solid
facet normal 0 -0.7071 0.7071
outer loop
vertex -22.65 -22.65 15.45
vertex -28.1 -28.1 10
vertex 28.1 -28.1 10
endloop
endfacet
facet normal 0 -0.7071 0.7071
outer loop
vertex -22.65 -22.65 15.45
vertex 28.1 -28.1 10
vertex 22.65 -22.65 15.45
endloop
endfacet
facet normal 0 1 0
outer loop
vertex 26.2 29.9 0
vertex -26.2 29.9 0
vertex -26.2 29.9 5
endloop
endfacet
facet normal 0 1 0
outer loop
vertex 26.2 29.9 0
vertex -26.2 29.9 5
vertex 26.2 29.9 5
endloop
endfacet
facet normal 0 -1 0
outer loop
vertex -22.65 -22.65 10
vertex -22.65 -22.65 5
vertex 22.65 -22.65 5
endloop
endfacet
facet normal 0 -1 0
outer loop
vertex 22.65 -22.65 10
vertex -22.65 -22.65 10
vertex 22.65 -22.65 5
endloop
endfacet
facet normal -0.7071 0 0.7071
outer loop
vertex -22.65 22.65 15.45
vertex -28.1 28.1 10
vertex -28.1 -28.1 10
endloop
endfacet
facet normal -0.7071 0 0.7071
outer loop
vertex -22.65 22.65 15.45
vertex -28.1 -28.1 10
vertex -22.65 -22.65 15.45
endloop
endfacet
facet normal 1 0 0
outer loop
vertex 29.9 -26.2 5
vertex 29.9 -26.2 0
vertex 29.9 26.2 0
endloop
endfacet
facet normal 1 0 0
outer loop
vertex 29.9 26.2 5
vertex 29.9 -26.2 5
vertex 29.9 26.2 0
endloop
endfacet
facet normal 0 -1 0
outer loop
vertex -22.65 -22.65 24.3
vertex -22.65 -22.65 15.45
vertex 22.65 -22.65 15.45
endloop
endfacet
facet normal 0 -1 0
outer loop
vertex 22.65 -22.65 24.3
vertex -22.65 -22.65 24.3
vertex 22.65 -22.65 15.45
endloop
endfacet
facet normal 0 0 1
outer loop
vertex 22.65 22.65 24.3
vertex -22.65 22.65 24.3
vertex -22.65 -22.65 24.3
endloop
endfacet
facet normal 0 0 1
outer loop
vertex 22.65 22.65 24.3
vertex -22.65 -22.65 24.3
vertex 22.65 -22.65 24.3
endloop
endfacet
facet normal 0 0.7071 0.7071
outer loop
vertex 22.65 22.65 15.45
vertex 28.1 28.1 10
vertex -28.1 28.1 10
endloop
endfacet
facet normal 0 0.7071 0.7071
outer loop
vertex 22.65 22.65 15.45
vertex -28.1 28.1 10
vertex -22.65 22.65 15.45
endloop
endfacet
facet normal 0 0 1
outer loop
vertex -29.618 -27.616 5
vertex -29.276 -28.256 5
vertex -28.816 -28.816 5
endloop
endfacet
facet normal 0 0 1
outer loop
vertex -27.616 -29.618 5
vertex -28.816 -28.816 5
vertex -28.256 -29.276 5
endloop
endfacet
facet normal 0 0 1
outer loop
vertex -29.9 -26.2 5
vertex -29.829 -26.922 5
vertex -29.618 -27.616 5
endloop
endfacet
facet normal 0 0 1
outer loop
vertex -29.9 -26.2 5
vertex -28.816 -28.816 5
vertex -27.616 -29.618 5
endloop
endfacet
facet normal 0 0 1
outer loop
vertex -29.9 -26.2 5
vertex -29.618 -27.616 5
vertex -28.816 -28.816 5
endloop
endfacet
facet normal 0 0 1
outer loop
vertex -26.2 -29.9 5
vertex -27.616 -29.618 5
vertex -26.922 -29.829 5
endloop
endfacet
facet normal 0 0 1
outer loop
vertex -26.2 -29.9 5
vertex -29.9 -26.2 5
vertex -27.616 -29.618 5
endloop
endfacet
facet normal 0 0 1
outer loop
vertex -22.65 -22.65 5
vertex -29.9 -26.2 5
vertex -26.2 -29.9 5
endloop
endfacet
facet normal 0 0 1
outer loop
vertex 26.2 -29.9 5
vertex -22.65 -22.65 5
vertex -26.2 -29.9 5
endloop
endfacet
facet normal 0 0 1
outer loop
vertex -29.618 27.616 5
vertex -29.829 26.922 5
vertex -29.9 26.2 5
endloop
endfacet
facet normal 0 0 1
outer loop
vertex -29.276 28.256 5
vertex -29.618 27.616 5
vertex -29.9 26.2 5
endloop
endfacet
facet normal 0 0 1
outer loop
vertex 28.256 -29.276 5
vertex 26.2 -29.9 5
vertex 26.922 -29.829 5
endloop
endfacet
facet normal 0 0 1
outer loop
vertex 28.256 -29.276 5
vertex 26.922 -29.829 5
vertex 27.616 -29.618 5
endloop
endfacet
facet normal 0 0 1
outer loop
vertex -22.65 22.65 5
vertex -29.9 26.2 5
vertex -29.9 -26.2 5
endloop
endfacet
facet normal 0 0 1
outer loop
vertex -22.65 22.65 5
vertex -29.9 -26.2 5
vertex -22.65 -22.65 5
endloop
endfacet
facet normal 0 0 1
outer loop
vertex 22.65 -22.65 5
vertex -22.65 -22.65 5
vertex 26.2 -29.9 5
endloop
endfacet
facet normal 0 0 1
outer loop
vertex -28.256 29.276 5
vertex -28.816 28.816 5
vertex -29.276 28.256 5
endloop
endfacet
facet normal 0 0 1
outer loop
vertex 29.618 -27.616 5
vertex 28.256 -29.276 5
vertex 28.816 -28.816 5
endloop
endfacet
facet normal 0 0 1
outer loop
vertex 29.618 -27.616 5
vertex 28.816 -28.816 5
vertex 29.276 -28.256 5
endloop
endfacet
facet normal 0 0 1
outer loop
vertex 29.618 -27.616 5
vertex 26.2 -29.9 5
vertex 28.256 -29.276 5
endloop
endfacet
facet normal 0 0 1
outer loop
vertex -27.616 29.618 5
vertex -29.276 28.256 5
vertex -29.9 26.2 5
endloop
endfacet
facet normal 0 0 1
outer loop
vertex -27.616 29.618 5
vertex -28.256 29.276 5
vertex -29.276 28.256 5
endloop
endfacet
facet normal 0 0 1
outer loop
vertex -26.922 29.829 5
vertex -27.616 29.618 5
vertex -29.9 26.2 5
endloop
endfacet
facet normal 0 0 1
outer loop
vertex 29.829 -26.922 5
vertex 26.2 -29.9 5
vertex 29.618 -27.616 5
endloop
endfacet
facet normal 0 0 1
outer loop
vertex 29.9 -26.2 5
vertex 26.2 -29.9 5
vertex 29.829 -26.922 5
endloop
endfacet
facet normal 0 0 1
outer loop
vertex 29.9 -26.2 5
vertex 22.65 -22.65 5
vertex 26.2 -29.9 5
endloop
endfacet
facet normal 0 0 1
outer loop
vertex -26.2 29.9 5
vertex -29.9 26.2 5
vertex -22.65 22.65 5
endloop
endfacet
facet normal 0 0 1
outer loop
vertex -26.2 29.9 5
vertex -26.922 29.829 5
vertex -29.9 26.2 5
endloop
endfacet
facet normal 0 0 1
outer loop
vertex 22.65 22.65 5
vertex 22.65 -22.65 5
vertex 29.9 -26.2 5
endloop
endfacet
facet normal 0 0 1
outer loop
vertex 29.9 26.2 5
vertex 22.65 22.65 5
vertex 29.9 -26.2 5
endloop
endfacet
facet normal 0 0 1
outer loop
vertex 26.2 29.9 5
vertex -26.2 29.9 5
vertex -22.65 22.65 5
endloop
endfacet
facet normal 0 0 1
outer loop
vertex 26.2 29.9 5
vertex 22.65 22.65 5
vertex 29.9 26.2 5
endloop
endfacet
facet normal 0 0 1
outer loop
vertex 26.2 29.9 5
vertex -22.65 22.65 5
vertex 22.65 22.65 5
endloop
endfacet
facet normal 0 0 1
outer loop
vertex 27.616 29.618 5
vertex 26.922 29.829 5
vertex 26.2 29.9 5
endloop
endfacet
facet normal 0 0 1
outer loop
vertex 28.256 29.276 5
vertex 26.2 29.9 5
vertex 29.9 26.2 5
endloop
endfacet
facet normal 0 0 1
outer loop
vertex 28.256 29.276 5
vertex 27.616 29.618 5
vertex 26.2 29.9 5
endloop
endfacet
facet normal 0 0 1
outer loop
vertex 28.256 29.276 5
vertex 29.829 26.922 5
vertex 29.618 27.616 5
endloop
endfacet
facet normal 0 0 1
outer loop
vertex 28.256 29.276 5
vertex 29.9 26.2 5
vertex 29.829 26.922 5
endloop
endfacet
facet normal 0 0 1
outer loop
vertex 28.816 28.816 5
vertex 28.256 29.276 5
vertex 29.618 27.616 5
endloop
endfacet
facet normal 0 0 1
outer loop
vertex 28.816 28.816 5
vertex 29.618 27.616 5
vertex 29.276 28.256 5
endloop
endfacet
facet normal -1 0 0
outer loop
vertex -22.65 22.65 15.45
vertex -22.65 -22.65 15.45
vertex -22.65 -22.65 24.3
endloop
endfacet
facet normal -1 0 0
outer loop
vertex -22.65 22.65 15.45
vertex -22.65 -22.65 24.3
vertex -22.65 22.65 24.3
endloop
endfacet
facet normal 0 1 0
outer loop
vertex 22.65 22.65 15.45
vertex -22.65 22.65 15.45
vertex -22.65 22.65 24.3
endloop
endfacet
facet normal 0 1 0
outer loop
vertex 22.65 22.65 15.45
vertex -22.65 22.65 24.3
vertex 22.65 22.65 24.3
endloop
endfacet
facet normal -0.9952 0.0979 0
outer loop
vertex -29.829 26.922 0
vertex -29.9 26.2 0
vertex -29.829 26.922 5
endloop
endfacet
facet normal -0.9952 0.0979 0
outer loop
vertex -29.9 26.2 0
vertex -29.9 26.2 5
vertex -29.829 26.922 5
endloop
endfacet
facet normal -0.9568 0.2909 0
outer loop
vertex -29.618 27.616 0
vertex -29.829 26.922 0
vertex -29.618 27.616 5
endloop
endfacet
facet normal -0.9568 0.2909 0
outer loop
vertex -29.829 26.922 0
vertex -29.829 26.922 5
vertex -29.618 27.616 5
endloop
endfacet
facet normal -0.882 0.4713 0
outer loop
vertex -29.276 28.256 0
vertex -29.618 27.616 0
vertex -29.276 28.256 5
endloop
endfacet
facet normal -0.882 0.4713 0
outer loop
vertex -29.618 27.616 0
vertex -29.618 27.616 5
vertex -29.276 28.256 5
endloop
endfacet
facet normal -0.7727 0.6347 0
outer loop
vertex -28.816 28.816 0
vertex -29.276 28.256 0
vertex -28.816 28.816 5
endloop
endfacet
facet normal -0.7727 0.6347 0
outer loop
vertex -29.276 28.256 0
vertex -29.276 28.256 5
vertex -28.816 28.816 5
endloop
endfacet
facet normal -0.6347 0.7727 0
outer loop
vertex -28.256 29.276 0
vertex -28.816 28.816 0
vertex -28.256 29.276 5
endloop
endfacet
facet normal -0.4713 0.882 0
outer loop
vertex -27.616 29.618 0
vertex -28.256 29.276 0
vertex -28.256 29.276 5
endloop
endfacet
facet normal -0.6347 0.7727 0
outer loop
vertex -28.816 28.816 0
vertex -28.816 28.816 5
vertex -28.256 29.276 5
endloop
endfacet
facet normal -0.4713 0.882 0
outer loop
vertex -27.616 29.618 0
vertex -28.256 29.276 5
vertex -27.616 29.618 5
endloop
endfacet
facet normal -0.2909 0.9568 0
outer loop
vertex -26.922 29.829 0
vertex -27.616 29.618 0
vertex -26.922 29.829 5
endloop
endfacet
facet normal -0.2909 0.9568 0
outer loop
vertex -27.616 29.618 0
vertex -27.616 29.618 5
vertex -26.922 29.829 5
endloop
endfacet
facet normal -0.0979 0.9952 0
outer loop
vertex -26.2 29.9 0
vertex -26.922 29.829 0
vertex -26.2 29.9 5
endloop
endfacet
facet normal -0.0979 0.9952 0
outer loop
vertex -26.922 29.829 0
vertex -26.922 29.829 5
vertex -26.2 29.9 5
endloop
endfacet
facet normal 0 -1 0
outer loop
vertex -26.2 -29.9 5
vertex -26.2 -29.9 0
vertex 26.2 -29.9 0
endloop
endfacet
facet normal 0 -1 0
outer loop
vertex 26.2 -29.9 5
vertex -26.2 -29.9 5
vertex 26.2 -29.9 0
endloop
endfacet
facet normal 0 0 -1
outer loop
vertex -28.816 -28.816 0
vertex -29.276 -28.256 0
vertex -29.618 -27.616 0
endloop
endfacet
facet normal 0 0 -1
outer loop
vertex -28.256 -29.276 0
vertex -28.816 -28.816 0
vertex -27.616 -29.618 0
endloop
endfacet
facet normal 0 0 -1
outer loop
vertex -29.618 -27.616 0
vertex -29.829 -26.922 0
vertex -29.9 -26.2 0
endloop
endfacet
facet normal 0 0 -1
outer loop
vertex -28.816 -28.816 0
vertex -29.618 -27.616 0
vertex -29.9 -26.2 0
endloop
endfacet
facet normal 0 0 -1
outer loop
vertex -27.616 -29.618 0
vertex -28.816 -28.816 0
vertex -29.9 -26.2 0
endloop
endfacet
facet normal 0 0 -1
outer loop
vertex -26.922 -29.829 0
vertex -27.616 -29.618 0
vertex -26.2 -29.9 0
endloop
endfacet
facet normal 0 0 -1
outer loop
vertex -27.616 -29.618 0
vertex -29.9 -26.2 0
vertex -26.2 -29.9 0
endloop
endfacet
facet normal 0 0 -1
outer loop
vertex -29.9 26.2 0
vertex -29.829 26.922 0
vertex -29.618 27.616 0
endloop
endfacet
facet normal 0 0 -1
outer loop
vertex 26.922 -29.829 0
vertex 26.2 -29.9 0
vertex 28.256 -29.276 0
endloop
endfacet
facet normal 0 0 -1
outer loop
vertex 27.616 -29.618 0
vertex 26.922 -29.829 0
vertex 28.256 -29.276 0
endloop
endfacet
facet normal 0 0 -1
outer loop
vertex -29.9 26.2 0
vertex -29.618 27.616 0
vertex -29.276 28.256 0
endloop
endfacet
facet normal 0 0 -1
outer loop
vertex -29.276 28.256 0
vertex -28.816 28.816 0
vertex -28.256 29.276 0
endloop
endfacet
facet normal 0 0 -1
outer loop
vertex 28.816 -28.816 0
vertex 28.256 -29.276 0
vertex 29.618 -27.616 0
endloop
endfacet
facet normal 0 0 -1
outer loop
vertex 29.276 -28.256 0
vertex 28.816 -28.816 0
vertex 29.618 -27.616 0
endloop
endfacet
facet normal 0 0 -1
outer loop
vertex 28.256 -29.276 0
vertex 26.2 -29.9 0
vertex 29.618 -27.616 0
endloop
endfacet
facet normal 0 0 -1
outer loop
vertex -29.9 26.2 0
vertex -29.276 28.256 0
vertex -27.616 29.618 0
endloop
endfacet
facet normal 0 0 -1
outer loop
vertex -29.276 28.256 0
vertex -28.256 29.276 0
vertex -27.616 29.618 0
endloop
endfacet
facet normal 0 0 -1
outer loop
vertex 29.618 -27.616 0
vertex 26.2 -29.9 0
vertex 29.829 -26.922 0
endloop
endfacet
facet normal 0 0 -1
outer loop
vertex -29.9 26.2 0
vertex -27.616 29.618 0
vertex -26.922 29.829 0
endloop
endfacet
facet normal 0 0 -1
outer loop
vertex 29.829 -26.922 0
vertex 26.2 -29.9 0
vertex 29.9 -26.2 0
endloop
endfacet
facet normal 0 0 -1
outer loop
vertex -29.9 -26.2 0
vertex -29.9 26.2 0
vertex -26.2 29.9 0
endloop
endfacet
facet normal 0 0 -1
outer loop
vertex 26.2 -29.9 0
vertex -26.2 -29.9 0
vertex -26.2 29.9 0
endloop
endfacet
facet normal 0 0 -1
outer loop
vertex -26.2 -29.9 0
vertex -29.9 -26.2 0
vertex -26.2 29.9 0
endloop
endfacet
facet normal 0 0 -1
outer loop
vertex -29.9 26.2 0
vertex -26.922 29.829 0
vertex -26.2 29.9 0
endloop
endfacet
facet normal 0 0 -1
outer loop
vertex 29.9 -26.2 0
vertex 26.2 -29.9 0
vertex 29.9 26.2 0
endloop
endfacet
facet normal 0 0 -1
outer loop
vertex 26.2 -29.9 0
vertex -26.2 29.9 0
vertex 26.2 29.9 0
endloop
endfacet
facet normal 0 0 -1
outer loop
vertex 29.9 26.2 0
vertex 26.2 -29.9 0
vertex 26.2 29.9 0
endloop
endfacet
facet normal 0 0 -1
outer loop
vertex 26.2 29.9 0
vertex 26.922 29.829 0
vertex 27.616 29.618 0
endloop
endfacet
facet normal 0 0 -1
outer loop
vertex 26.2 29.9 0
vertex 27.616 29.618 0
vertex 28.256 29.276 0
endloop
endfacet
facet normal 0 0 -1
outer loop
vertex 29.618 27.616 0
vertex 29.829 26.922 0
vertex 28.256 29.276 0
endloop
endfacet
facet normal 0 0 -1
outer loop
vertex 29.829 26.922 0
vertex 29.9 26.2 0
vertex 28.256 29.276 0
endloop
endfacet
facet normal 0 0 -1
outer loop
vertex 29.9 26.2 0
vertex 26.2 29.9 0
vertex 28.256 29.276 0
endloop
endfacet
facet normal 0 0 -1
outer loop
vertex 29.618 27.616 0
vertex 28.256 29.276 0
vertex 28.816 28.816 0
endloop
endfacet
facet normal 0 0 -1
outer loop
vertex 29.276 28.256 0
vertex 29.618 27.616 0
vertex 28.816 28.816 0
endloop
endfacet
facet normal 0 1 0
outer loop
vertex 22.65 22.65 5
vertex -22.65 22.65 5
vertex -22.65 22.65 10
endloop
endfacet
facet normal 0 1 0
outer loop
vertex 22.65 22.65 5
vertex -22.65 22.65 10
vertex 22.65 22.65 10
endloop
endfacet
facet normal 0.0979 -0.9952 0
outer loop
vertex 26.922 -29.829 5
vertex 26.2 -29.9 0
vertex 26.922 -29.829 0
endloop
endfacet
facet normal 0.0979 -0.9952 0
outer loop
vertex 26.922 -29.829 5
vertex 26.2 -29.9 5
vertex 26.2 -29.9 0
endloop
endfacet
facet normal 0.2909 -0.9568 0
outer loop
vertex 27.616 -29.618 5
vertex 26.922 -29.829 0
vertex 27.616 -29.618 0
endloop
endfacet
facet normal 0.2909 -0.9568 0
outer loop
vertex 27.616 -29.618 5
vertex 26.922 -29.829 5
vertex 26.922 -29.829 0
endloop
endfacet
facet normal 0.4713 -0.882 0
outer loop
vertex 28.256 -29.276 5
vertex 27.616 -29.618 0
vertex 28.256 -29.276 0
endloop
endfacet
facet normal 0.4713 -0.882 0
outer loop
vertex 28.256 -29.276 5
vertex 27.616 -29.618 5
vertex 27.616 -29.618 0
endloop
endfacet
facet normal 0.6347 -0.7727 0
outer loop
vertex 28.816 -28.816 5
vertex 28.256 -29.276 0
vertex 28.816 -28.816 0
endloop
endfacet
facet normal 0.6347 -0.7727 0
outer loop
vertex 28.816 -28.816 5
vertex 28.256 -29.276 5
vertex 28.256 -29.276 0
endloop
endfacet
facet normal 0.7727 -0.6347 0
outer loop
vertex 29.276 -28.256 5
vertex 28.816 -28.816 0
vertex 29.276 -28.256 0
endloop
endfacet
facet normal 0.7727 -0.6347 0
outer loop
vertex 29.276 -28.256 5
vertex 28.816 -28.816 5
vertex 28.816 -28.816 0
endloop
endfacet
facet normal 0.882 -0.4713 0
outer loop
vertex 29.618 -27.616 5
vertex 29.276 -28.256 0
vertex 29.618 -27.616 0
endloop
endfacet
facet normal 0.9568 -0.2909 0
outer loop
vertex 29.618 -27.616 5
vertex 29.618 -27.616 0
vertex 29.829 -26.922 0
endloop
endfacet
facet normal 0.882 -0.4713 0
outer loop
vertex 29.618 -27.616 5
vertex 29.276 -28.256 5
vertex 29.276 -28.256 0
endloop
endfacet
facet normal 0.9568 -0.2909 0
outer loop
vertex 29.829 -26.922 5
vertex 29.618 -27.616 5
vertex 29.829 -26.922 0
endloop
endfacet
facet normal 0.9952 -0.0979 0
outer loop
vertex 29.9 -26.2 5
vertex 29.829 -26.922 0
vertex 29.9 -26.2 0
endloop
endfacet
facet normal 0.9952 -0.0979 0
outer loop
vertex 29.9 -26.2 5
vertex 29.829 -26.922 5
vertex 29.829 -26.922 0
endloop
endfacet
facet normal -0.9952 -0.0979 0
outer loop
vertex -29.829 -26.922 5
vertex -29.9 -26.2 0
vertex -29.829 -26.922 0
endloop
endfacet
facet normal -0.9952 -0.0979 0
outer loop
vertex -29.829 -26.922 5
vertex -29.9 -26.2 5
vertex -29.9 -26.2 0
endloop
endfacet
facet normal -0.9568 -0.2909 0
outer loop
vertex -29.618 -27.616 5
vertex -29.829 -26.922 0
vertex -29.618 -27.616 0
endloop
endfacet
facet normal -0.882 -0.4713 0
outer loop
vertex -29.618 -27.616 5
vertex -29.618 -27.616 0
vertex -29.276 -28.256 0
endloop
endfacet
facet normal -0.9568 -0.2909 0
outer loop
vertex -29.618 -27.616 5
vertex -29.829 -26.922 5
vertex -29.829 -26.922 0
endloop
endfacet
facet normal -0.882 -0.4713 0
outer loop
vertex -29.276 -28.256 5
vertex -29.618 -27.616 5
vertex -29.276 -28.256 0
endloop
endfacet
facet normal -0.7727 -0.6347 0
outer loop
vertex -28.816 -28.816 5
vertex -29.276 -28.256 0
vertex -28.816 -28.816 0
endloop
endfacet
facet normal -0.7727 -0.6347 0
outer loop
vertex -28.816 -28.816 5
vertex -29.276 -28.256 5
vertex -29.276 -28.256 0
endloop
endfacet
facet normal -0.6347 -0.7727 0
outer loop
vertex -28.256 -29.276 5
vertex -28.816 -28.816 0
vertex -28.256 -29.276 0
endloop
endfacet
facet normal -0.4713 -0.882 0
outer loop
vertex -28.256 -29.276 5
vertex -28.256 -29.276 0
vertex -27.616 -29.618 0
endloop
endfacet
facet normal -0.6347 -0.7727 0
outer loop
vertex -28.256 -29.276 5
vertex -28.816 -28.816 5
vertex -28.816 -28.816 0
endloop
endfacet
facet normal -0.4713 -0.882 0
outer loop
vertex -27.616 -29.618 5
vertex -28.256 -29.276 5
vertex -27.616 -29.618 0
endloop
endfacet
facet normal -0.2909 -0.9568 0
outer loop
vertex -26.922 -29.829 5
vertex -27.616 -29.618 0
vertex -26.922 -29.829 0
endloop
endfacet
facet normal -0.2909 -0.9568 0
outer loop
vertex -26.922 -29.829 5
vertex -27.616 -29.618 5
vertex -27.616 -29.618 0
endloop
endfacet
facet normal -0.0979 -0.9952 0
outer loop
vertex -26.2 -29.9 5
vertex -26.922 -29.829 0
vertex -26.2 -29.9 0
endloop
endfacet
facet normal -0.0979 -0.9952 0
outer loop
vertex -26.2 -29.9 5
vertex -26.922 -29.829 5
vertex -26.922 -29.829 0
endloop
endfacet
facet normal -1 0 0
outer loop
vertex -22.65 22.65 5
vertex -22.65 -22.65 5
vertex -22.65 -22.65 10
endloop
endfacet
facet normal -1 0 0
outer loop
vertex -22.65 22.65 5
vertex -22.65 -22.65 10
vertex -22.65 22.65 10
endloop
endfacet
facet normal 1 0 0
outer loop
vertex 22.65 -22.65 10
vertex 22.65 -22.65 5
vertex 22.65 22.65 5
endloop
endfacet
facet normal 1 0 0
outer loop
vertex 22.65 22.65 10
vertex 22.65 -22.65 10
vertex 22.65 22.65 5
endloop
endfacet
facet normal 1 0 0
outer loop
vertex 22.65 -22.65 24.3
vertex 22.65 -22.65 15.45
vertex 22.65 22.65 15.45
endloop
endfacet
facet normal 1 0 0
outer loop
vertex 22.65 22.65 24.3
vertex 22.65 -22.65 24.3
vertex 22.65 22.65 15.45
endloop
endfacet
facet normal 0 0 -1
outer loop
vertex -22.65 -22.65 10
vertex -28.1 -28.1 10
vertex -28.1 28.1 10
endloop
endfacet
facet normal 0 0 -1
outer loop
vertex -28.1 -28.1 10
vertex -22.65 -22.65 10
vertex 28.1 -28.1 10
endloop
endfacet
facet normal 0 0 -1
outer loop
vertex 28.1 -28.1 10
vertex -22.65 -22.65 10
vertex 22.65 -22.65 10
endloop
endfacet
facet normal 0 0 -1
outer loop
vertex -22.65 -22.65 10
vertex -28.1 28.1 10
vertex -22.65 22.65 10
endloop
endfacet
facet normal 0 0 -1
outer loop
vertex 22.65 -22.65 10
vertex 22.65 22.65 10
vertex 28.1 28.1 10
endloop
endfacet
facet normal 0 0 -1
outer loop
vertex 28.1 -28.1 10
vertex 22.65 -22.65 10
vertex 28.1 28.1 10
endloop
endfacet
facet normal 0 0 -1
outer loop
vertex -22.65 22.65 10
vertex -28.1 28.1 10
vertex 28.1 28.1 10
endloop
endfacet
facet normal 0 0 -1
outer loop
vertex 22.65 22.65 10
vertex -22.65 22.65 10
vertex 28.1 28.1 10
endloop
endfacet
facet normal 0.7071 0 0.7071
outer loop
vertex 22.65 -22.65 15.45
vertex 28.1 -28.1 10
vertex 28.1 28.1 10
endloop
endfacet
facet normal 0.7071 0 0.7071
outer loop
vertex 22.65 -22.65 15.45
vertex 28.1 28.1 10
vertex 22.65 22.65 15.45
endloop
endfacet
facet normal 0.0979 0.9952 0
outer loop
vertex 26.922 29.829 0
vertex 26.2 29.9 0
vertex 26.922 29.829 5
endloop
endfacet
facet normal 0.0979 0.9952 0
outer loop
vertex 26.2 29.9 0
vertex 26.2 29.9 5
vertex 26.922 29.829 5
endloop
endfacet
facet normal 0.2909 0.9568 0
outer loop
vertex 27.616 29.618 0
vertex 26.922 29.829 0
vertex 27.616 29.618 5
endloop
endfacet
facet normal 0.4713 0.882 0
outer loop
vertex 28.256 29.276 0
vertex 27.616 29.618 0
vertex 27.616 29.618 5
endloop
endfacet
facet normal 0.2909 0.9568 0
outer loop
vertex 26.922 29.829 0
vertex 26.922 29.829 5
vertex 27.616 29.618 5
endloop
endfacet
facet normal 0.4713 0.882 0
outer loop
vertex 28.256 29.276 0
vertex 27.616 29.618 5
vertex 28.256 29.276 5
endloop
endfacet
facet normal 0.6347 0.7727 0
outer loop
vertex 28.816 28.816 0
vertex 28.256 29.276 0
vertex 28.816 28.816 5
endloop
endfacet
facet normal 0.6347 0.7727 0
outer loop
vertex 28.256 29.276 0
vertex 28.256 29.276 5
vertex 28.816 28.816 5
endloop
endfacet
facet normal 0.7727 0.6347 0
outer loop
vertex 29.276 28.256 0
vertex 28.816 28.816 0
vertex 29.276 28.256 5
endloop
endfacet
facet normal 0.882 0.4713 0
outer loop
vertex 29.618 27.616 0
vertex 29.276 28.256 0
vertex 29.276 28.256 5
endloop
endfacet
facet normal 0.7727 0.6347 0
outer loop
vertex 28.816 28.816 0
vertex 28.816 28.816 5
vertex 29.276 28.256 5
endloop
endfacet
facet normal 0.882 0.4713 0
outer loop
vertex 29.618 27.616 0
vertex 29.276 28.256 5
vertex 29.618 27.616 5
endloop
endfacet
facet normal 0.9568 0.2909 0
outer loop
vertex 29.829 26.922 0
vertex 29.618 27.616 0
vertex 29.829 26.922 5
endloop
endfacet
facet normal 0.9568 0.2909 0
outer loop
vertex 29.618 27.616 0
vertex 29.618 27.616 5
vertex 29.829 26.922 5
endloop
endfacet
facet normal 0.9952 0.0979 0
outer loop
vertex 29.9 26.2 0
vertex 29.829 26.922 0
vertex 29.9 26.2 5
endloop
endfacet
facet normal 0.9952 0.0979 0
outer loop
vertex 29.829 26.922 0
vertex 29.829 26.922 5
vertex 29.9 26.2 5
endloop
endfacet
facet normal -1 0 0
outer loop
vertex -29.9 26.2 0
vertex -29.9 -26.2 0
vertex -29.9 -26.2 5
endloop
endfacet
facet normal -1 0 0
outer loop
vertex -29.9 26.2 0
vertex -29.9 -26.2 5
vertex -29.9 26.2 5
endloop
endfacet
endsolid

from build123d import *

# Parameters (mm, degrees)
ESQUISSE1_W        = 59.8
ESQUISSE1_H        = 59.8
BOSS_EXTRU_1_DEPTH = 5
ESQUISSE2_W        = 45.3
ESQUISSE2_H        = 45.3
BOSS_EXTRU_2_DEPTH = 24.3
CONG_1_R           = 3.7
ESQUISSE6_W        = 56.2
ESQUISSE6_H        = 56.2
BOSS_EXTRU_4_DEPTH = 10
BOSS_EXTRU_4_TAPER = 45


with BuildPart() as part:
    # Esquisse1 → Boss.-Extru.1 (new body)
    with BuildSketch(Plane.XY):
        Rectangle(ESQUISSE1_W, ESQUISSE1_H)
    extrude(amount=BOSS_EXTRU_1_DEPTH)

    # Esquisse2 → Boss.-Extru.2 (add)
    with BuildSketch(Plane.XY):
        Rectangle(ESQUISSE2_W, ESQUISSE2_H)
    extrude(amount=BOSS_EXTRU_2_DEPTH)

    # Congé1
    cong_1_edges = [part.edges().sort_by_distance(p)[0] for p in [
        (29.9, -29.9, 2.5),
        (-29.9, -29.9, 2.5),
        (-29.9, 29.9, 2.5),
        (29.9, 29.9, 2.5),
    ]]
    fillet(cong_1_edges, radius=CONG_1_R)

    # Esquisse6 → Boss.-Extru.4 (add)
    with BuildSketch(Plane.XY.offset(10)):
        Rectangle(ESQUISSE6_W, ESQUISSE6_H)
    extrude(amount=BOSS_EXTRU_4_DEPTH, taper=BOSS_EXTRU_4_TAPER)


solid = part.part
